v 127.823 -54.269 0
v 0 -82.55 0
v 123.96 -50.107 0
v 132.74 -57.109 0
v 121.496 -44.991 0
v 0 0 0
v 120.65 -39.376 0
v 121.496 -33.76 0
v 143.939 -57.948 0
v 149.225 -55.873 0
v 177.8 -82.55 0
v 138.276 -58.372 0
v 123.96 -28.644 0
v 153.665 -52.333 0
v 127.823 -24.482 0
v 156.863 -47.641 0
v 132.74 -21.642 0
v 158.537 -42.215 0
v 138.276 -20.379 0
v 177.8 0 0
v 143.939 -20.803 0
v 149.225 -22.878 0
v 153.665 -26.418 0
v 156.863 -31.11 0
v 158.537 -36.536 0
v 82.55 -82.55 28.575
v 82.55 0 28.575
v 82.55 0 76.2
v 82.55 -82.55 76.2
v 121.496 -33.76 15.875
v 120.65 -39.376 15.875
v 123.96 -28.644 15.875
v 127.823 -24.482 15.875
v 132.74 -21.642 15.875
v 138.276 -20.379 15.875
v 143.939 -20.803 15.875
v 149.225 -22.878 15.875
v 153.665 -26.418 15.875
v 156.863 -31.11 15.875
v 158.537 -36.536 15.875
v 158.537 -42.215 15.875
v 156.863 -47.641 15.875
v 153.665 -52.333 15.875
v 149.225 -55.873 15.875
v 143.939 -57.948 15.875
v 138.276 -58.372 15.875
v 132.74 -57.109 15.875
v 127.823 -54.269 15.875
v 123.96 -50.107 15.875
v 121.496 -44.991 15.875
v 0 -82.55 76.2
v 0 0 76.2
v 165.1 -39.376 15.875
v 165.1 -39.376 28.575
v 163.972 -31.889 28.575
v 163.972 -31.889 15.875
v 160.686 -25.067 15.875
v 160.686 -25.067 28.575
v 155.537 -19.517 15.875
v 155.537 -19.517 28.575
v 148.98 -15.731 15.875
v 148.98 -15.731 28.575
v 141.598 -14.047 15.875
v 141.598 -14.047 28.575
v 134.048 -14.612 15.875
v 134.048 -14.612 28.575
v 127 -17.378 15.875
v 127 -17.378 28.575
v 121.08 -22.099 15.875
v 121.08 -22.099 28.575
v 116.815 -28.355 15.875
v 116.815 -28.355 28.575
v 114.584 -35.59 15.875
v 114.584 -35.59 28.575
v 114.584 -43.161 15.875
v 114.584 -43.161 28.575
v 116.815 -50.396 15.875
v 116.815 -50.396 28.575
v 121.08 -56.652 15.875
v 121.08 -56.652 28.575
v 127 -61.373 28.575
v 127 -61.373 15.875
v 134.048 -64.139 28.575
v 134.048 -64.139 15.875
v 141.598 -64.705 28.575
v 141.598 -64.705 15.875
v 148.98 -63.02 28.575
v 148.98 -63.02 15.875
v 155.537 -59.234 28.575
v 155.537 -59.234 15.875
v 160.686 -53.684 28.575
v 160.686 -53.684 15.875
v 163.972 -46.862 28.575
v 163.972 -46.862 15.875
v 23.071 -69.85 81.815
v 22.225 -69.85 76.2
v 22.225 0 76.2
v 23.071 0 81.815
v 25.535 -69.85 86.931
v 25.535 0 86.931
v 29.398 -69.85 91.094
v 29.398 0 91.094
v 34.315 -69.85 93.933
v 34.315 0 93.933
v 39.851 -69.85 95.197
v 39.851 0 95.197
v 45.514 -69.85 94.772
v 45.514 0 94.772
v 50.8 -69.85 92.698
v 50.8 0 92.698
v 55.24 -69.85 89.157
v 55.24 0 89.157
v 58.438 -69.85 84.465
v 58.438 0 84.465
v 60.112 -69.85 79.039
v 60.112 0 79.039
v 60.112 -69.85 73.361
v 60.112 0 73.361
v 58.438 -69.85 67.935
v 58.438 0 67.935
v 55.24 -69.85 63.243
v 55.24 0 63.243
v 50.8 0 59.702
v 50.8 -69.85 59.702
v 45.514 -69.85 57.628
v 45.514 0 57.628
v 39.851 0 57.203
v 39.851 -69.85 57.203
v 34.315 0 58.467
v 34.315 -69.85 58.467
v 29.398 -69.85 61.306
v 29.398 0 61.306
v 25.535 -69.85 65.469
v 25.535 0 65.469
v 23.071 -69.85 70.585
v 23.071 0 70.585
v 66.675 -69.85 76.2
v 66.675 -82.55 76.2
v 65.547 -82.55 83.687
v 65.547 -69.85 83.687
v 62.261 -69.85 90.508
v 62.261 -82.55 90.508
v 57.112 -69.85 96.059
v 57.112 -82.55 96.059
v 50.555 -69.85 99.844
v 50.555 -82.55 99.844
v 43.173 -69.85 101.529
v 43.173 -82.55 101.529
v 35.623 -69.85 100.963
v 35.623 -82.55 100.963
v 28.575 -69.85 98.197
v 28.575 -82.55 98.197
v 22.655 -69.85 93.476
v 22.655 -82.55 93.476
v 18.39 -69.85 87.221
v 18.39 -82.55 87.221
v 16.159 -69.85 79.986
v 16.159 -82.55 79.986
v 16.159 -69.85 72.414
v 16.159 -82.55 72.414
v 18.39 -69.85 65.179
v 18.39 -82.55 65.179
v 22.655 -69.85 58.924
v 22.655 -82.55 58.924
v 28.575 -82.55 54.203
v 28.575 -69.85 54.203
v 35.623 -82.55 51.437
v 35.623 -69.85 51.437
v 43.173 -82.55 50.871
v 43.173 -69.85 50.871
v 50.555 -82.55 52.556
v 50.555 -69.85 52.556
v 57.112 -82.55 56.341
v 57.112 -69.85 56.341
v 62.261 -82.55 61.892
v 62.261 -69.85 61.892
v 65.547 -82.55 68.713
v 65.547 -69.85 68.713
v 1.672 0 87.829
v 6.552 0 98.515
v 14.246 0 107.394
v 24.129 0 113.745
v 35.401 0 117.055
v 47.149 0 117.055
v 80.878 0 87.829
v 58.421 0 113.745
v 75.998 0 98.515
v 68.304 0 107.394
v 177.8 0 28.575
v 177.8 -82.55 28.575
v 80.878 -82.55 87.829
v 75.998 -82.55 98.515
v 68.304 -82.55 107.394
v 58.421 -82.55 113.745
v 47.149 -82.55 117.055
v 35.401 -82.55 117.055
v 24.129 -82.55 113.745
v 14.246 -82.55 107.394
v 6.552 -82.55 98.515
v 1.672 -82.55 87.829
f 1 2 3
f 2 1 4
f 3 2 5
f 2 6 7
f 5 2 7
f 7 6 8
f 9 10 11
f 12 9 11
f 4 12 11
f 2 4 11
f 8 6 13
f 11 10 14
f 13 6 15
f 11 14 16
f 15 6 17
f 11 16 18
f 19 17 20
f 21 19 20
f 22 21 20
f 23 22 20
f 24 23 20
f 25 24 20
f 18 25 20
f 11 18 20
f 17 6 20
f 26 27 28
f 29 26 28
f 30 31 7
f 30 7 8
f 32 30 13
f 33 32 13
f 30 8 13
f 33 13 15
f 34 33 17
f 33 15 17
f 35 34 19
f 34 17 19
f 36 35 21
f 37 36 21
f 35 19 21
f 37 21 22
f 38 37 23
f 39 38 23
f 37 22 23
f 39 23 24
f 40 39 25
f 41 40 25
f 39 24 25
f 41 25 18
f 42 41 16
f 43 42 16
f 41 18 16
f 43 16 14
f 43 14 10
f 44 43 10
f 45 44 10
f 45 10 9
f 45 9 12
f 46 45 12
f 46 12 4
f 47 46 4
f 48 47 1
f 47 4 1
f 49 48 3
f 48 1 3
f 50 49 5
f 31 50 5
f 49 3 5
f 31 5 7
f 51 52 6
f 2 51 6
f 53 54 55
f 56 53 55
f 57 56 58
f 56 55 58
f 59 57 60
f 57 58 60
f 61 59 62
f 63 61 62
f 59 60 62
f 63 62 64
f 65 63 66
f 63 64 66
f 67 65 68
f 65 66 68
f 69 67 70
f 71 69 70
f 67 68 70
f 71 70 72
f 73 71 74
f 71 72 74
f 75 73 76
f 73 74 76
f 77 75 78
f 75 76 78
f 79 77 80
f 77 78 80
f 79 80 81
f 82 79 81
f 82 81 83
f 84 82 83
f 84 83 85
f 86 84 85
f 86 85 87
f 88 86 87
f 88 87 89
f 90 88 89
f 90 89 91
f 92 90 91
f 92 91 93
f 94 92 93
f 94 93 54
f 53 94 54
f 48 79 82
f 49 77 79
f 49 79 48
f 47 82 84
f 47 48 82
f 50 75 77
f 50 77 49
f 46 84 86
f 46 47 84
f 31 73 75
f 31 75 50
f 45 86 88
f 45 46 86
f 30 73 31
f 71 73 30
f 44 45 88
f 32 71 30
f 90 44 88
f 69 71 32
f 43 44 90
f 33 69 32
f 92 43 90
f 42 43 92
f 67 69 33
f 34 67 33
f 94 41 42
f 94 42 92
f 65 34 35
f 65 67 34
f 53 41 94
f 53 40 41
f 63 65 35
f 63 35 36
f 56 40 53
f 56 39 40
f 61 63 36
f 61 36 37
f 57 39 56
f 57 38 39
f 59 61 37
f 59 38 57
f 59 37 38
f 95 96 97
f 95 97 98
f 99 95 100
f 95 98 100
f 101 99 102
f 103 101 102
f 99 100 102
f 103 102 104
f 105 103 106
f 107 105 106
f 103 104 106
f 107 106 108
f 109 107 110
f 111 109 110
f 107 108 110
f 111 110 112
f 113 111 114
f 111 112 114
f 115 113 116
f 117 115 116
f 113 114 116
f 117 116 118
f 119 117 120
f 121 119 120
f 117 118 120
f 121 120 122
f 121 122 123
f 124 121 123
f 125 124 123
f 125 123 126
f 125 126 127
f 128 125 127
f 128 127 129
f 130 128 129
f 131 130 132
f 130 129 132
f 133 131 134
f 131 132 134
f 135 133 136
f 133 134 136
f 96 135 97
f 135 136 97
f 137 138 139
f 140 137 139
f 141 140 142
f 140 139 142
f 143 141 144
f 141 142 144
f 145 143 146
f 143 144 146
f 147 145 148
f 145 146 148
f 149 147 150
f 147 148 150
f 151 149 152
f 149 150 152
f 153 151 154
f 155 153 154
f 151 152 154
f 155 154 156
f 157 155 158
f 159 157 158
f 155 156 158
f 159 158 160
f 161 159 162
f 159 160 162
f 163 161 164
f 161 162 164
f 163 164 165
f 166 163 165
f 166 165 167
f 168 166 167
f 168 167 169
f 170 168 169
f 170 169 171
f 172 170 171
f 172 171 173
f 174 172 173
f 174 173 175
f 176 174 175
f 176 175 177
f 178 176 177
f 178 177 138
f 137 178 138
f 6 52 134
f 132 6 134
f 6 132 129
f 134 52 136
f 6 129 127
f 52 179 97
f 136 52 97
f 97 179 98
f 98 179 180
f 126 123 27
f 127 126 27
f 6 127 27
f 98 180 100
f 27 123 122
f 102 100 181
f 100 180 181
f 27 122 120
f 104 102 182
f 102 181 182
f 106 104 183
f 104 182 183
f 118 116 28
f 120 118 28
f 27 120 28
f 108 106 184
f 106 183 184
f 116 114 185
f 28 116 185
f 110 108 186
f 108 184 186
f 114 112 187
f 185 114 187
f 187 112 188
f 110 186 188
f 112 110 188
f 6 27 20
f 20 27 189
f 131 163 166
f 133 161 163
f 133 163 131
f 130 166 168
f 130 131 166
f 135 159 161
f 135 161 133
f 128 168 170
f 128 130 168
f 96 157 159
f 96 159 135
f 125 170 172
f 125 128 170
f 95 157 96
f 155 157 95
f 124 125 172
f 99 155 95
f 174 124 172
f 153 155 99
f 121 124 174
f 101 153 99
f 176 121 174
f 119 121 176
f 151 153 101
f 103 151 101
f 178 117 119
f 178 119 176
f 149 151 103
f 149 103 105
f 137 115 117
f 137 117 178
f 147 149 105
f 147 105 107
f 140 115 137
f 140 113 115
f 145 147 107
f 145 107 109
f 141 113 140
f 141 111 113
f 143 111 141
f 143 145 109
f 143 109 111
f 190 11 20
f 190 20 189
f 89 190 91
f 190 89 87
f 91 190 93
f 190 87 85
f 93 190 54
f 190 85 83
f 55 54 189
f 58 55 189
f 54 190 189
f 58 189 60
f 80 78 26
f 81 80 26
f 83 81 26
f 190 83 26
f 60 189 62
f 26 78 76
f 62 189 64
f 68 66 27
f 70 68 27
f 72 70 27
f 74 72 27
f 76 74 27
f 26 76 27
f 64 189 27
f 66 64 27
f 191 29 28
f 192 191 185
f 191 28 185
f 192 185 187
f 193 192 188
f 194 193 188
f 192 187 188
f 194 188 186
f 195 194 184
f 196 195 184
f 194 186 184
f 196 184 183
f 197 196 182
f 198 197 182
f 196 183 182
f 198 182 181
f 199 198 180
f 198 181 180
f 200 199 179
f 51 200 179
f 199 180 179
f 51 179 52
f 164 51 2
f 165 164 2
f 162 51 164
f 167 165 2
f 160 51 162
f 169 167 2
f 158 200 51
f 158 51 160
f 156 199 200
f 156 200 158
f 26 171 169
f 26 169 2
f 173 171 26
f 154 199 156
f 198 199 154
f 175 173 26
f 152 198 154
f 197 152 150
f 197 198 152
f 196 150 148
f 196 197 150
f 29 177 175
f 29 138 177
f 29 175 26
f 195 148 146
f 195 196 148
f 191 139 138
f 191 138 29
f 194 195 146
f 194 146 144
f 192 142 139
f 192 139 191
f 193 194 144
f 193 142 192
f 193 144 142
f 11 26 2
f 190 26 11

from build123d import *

# Parameters (mm, degrees)
F1_DEPTH       = 82.55
F4_D           = 38.1
F4_CBORE_D     = 50.8
F4_CBORE_DEPTH = 12.7
F5_D           = 38.1
F5_CBORE_D     = 50.8
F5_CBORE_DEPTH = 12.7


with BuildPart() as f1:
    # F0 (on Front) → F1 (new body)
    with BuildSketch(Plane.XZ):
        with BuildLine():
            Line((0, 76.2), (0, 0))
            Line((0, 0), (177.8, 0))
            Line((177.8, 0), (177.8, 28.575))
            Line((177.8, 28.575), (82.55, 28.575))
            Line((82.55, 28.575), (82.55, 76.2))
            ThreePointArc((82.55, 76.2), (41.275, 117.475), (0, 76.2))
        make_face()
    extrude(amount=F1_DEPTH)

    # F4 (through all)
    with Locations(Plane.XZ.offset(82.55)):
        with Locations((41.275, 76.2)):
            CounterBoreHole(F4_D / 2, F4_CBORE_D / 2, F4_CBORE_DEPTH)

    # F5 (through all)
    with Locations(Plane.XY.offset(28.575)):
        with Locations((139.7, -39.375536)):
            CounterBoreHole(F5_D / 2, F5_CBORE_D / 2, F5_CBORE_DEPTH)


solid = f1.part
